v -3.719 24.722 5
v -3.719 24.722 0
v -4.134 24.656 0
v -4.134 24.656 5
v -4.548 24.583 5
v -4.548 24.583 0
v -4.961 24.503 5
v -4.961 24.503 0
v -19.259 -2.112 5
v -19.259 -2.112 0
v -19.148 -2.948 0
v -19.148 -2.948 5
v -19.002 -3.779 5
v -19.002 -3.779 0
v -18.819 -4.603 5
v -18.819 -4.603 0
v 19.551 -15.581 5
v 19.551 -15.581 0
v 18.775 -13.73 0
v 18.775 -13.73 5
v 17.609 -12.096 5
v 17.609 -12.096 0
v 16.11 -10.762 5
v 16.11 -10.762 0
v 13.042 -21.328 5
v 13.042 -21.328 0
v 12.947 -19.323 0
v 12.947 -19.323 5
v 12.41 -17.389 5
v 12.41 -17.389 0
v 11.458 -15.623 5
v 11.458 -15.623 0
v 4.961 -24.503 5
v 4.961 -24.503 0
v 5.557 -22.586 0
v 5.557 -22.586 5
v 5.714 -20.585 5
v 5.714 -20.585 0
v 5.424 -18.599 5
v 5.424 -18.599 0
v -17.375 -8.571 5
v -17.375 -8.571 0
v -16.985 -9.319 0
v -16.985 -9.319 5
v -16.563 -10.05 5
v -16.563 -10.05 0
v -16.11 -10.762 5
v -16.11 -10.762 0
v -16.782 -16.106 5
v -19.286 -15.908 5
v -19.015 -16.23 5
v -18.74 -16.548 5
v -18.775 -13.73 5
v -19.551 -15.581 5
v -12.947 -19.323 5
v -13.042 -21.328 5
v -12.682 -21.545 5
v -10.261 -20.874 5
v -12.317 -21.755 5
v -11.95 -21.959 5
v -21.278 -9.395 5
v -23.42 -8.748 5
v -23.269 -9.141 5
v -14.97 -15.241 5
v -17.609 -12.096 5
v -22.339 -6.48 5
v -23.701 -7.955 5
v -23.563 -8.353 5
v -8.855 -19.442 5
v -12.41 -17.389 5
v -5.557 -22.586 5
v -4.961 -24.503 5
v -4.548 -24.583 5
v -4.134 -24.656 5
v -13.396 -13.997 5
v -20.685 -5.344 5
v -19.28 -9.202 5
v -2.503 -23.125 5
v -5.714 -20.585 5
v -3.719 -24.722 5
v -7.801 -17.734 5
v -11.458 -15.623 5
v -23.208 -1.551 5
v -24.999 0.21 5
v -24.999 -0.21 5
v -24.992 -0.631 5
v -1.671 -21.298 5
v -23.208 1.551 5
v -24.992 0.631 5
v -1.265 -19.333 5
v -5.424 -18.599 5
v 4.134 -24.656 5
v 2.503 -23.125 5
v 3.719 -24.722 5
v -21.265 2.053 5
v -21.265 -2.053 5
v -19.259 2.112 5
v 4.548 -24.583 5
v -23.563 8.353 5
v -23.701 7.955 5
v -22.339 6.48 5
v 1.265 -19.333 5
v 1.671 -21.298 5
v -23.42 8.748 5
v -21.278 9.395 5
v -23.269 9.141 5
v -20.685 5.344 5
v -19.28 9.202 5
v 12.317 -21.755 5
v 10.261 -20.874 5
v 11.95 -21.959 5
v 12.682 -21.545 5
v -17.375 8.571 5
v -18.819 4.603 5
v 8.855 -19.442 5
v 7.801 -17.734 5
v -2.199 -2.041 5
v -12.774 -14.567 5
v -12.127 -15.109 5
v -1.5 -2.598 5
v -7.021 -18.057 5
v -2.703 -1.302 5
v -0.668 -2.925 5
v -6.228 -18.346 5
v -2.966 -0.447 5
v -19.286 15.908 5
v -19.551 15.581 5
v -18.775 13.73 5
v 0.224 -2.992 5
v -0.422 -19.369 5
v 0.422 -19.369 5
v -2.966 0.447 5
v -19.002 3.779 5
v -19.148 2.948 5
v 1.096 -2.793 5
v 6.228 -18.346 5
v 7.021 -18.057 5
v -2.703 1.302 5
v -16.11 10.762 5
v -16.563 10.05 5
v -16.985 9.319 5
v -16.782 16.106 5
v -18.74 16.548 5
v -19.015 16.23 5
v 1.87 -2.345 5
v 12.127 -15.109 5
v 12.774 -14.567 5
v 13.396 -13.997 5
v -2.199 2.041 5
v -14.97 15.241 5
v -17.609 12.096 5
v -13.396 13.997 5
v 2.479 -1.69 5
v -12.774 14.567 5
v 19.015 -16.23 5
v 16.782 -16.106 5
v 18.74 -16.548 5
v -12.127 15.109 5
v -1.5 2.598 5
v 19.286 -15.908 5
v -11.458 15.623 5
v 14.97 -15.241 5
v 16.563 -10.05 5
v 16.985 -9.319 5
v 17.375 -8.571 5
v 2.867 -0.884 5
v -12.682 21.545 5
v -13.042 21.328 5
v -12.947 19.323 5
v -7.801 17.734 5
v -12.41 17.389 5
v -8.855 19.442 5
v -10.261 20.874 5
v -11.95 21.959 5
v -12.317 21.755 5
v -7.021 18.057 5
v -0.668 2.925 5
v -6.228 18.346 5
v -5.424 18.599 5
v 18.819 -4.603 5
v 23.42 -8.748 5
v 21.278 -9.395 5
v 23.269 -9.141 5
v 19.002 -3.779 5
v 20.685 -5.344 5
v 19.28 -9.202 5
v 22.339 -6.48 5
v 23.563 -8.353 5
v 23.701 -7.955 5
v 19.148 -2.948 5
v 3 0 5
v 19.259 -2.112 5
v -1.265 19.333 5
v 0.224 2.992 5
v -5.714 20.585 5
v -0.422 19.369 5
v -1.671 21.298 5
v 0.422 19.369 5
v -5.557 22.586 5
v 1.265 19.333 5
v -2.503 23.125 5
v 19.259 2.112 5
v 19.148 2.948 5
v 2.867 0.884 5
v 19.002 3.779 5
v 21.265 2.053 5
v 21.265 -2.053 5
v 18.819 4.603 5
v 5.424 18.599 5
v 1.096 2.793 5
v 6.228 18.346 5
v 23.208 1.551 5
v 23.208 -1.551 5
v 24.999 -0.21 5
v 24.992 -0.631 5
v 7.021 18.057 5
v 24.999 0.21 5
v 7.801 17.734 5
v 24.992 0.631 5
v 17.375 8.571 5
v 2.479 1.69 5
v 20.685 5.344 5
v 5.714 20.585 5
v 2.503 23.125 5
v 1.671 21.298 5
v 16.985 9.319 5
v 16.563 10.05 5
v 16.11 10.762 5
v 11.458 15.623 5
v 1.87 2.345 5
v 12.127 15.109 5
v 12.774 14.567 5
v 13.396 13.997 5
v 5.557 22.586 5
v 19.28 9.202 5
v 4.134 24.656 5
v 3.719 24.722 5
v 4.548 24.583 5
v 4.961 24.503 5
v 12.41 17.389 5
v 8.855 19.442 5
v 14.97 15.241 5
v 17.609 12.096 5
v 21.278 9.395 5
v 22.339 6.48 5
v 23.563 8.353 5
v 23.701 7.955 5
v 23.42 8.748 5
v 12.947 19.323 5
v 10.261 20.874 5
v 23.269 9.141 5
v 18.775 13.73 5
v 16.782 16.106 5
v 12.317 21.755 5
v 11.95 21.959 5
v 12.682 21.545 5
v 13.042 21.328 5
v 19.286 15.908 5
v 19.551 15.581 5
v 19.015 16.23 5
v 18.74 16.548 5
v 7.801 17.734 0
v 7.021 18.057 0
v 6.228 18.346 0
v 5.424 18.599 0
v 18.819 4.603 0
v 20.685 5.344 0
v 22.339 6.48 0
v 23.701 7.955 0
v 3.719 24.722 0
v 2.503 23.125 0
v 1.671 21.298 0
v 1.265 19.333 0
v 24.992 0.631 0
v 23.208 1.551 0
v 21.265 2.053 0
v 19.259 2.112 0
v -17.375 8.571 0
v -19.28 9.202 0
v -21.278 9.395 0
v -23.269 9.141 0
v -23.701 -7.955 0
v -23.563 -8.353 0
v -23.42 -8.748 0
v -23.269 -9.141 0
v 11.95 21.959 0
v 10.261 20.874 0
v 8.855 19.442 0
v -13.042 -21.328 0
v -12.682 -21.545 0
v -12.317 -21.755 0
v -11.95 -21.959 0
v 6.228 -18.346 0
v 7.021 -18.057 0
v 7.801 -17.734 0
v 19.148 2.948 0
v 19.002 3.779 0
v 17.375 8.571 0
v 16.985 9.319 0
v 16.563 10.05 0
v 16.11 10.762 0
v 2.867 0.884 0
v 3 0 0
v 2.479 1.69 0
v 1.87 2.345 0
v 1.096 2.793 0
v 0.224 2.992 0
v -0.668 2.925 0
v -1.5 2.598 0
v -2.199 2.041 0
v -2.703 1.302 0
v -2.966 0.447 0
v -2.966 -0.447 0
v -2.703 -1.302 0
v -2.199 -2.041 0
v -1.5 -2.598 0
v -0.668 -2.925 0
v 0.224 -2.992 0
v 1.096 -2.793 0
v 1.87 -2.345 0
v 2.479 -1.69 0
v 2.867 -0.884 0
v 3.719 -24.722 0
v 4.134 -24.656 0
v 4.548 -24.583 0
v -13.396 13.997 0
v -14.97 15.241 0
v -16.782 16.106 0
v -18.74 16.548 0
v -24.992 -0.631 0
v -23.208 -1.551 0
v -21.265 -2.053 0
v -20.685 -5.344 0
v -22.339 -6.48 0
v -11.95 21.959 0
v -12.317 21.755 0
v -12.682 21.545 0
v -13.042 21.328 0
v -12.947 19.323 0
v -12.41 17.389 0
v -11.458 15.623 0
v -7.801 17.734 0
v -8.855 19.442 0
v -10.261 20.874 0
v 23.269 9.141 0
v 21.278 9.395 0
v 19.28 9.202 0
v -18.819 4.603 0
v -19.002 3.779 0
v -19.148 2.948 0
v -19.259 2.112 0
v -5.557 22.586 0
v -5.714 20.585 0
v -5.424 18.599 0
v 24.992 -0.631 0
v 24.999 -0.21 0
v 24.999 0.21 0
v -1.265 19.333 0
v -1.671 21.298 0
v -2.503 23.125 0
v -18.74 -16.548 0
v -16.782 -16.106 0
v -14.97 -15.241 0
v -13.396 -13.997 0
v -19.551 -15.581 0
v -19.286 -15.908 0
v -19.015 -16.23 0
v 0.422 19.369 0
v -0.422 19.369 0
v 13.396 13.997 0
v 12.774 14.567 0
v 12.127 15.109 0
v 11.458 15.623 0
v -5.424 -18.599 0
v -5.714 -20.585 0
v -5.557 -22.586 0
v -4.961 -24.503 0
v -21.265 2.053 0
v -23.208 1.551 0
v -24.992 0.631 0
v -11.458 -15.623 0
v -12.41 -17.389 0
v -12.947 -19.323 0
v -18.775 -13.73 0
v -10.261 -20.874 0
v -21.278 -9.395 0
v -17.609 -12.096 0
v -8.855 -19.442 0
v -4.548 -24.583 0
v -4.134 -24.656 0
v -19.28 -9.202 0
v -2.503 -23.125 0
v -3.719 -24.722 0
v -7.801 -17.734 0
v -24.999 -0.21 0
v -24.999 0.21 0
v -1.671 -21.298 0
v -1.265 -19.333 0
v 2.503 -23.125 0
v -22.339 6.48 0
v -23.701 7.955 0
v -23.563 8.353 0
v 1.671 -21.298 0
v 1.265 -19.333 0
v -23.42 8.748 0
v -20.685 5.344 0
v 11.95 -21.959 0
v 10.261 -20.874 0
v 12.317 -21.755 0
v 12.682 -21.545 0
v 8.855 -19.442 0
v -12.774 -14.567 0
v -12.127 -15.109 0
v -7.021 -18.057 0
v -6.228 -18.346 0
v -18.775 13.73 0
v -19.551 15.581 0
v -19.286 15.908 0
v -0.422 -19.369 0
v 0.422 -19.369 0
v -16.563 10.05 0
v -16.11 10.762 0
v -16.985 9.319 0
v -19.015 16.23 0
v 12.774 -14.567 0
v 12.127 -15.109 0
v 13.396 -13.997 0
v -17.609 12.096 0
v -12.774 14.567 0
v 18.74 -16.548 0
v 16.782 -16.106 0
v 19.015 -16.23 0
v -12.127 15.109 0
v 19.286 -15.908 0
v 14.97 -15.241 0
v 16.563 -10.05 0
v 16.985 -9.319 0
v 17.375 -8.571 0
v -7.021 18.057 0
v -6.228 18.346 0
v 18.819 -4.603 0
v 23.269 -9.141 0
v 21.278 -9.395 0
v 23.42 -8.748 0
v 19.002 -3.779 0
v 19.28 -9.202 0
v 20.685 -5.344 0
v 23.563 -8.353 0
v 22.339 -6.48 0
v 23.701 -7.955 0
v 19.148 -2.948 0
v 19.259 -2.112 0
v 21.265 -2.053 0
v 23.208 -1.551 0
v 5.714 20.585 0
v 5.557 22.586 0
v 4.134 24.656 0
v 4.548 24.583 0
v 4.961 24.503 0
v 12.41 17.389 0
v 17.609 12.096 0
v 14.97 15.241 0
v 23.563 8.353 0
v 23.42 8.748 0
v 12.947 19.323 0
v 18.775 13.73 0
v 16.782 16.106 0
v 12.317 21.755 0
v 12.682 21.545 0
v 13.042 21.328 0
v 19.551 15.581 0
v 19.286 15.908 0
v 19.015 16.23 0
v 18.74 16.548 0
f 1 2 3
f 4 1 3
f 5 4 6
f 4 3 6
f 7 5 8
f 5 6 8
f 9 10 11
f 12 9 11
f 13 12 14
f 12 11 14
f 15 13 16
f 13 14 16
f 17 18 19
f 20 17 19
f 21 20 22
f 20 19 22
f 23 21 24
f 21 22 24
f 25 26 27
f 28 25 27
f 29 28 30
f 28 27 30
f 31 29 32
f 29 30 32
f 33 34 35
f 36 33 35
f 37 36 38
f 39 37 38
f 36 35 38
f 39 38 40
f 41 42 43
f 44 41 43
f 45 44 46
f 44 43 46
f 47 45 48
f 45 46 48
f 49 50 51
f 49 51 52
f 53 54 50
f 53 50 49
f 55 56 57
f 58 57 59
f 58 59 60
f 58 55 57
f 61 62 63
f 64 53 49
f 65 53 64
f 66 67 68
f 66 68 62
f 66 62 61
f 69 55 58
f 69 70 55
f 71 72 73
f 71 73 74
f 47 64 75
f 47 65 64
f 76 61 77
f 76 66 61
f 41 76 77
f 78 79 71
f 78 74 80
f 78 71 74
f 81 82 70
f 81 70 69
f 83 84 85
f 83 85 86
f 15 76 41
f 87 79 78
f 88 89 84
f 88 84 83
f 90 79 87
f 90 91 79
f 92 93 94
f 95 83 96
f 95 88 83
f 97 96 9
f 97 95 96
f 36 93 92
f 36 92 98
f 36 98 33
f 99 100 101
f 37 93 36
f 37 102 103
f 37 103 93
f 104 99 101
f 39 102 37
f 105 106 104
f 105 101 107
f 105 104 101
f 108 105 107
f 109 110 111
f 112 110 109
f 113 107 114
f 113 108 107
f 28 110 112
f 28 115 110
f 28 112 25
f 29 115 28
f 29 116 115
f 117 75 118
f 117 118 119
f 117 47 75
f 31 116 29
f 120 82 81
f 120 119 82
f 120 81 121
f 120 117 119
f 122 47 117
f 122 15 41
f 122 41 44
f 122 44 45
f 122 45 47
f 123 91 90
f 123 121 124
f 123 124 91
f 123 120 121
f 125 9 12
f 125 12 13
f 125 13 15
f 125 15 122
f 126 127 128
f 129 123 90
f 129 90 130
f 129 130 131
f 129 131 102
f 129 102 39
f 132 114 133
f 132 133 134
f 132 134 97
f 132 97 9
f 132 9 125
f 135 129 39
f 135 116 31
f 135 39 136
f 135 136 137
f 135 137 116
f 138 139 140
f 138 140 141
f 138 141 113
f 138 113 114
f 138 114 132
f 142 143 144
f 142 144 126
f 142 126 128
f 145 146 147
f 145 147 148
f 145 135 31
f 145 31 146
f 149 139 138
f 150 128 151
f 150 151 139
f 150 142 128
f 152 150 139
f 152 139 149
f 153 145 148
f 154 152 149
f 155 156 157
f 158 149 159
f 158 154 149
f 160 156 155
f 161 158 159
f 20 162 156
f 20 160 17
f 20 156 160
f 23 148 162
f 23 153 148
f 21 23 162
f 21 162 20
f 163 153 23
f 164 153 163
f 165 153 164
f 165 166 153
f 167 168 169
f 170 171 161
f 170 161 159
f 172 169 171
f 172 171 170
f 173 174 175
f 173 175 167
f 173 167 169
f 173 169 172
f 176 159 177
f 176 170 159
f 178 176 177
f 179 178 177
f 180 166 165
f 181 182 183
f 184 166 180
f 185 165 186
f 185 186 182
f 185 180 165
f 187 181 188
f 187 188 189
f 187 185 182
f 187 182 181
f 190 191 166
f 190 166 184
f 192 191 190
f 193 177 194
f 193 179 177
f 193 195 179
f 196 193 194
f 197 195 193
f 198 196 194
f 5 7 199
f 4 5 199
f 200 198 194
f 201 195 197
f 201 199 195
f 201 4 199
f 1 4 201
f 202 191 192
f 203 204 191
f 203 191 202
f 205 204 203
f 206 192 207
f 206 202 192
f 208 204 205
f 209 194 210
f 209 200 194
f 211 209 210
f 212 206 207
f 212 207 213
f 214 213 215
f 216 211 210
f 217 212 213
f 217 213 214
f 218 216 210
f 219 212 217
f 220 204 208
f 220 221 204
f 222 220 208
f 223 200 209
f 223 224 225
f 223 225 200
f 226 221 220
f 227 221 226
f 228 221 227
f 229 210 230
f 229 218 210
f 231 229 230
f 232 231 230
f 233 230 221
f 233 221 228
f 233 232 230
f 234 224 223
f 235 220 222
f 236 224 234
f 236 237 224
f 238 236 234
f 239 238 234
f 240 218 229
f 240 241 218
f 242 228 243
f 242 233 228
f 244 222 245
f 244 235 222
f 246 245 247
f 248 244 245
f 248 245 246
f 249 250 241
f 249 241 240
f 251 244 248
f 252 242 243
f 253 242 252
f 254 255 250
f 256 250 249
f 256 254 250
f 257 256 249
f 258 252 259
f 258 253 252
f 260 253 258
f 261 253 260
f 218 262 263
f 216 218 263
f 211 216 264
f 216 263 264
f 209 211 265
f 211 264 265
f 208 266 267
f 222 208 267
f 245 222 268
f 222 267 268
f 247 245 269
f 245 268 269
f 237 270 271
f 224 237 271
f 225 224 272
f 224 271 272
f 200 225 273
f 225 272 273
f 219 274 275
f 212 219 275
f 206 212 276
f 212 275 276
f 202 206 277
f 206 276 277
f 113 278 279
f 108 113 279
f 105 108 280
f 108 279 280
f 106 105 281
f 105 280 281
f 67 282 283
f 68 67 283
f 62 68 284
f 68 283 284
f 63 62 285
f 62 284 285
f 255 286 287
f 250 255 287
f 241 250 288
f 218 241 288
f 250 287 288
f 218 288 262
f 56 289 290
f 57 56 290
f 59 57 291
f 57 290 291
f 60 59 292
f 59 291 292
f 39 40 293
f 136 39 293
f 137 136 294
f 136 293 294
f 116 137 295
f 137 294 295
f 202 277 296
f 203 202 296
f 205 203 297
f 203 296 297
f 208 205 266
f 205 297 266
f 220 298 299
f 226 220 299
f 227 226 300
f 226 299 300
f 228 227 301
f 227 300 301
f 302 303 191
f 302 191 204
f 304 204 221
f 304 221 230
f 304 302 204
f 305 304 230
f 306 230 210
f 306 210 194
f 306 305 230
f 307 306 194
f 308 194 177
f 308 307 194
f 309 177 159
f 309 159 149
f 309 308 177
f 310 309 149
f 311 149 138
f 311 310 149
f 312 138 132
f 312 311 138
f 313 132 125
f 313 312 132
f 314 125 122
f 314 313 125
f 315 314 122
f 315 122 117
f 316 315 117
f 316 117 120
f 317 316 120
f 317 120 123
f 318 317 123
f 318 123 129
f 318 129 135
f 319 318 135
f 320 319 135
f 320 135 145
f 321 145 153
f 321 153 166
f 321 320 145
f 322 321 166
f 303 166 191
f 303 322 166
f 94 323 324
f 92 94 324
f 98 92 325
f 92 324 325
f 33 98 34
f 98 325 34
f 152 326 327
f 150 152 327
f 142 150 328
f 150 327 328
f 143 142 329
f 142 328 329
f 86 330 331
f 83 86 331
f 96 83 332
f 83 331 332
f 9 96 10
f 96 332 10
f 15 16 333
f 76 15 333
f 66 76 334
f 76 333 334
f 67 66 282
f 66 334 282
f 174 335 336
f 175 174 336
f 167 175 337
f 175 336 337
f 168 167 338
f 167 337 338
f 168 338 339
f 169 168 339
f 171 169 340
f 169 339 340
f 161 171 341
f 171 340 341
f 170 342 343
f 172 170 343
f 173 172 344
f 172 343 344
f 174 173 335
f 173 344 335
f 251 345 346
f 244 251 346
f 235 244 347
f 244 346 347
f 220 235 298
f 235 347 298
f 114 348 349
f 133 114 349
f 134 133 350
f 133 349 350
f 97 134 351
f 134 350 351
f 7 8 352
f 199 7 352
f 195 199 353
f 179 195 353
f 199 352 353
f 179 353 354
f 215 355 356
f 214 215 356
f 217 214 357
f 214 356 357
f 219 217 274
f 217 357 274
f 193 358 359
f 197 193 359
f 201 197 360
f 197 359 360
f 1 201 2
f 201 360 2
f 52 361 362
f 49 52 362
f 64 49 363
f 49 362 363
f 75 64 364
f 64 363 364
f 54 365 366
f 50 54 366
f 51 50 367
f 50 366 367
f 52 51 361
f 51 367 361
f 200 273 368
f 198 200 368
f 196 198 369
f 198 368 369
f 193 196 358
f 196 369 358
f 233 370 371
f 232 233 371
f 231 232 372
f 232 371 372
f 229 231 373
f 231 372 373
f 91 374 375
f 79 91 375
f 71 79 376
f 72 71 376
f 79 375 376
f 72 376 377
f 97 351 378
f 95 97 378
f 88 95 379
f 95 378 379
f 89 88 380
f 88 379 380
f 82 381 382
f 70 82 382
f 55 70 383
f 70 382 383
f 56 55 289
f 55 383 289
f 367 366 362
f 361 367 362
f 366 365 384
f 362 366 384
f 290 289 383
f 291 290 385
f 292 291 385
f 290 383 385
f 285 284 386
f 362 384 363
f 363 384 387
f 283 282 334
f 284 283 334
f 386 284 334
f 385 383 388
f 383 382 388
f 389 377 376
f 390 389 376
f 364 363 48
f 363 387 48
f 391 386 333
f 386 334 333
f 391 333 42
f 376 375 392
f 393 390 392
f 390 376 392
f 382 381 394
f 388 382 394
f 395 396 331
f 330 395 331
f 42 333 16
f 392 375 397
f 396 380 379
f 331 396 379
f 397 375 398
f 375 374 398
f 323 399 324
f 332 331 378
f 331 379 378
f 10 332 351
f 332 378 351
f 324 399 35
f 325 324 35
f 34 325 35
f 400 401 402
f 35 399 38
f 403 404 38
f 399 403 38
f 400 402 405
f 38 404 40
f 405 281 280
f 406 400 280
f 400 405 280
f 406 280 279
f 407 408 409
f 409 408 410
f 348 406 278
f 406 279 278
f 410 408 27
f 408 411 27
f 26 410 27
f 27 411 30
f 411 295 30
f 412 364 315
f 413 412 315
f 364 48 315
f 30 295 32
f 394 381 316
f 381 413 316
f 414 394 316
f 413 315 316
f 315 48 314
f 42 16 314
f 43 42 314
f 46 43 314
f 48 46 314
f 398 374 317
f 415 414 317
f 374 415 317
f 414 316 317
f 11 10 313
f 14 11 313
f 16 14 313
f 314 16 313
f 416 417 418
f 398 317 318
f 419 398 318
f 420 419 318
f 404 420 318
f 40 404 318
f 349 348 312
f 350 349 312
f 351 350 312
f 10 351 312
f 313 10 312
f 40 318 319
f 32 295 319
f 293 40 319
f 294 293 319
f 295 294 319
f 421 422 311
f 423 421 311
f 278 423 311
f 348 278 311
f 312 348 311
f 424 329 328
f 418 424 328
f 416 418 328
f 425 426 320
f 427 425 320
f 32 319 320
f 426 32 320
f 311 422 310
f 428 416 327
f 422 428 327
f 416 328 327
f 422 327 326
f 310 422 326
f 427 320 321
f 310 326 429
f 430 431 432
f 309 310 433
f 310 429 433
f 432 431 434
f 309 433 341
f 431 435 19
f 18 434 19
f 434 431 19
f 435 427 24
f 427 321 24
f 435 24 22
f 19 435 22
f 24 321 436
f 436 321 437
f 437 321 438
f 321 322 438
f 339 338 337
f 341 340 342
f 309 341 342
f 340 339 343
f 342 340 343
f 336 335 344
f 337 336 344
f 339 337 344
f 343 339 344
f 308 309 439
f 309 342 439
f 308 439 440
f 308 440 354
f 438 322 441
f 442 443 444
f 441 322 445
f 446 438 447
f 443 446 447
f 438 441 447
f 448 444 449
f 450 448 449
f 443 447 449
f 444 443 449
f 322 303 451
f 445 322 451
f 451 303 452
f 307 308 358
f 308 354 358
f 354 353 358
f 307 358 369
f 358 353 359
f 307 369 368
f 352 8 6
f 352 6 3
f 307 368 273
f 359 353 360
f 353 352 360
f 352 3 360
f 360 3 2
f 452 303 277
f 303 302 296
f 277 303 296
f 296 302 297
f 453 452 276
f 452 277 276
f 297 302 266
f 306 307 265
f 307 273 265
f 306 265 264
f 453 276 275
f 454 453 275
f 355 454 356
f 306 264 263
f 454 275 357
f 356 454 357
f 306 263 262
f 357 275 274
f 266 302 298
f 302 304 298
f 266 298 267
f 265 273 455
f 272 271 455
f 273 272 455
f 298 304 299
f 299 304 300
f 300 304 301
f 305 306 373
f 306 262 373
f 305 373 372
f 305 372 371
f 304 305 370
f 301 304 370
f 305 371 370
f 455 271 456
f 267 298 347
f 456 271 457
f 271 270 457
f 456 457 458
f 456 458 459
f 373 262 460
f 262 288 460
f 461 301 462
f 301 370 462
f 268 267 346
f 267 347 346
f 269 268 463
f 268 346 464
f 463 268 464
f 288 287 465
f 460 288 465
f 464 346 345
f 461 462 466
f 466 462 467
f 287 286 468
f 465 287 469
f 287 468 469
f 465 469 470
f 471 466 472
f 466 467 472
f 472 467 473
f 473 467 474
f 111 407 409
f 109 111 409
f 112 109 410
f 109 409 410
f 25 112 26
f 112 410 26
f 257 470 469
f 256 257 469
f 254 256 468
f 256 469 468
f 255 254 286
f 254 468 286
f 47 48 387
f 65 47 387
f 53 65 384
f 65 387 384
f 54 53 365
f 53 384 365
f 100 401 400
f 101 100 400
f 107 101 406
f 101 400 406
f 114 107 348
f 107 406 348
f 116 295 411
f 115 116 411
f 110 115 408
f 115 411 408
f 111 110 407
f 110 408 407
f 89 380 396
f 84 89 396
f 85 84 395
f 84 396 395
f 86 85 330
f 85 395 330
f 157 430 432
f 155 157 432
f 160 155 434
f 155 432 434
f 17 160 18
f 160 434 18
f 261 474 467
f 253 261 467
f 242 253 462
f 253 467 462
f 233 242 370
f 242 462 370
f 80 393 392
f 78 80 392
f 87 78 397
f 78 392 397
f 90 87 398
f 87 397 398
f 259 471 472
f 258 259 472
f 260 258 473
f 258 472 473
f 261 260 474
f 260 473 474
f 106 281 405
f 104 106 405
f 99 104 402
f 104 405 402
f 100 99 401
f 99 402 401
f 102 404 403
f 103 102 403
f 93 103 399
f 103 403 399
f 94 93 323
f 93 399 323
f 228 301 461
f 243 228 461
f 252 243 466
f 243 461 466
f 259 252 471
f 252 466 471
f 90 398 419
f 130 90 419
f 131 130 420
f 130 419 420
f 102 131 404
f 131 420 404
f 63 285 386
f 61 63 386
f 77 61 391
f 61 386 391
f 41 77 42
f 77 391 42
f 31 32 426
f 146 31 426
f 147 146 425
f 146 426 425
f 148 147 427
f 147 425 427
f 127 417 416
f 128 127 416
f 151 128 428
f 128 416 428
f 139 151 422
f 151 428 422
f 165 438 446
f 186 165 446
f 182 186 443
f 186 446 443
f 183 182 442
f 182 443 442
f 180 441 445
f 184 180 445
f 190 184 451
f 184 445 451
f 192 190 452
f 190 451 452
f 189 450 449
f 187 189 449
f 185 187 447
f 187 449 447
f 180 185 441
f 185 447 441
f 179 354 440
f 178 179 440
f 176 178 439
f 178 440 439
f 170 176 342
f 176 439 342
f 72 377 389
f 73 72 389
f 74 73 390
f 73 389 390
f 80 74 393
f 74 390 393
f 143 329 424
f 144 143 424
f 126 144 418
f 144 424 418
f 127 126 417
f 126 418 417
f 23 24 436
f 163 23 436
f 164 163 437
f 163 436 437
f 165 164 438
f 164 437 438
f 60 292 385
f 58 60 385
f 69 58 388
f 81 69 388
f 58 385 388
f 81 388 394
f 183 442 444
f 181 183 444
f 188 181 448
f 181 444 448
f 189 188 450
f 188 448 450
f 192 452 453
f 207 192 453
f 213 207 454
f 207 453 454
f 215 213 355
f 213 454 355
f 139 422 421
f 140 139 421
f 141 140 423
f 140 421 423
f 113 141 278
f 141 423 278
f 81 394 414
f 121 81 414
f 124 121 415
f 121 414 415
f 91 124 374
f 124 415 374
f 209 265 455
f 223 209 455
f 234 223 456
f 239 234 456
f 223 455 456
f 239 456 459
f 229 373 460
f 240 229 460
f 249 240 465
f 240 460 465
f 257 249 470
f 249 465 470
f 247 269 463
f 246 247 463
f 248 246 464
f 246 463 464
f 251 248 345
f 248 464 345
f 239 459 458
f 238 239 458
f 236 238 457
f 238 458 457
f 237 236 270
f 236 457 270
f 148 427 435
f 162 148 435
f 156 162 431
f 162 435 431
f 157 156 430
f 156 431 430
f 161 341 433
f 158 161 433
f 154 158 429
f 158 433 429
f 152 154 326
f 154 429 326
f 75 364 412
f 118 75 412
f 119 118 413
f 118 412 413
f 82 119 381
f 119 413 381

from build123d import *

# Parameters (mm, degrees)
SKETCH1_R           = 3
BOSS_EXTRUDE2_DEPTH = 5


with BuildPart() as part:
    # Sketch1 → Boss-Extrude2 (new body)
    with BuildSketch(Plane.XY):
        with BuildLine():
            ThreePointArc((-19.550519413, 15.581309017), (-18.238129642, 12.880402273), (-16.110253623, 10.761580005))
            ThreePointArc((-16.110253623, 10.761580005), (-16.778376173, 9.687), (-17.374928481, 8.571098896))
            ThreePointArc((-17.374928481, 8.571098896), (-20.2738204, 9.354482451), (-23.269069139, 9.14059196))
            ThreePointArc((-23.269069139, 9.14059196), (-23.49231552, 8.550503583), (-23.700600368, 7.954969654))
            ThreePointArc((-23.700600368, 7.954969654), (-21.543592873, 5.865811255), (-18.819363584, 4.602546066))
            ThreePointArc((-18.819363584, 4.602546066), (-19.079665407, 3.364259794), (-19.258580553, 2.111622855))
            ThreePointArc((-19.258580553, 2.111622855), (-22.250580854, 1.856283171), (-24.992039135, 0.630856452))
            ThreePointArc((-24.992039135, 0.630856452), (-25, 0), (-24.992039135, -0.630856452))
            ThreePointArc((-24.992039135, -0.630856452), (-22.250580854, -1.856283171), (-19.258580553, -2.111622855))
            ThreePointArc((-19.258580553, -2.111622855), (-19.079665407, -3.364259794), (-18.819363584, -4.602546066))
            ThreePointArc((-18.819363584, -4.602546066), (-21.543592873, -5.865811255), (-23.700600368, -7.954969654))
            ThreePointArc((-23.700600368, -7.954969654), (-23.49231552, -8.550503583), (-23.269069139, -9.14059196))
            ThreePointArc((-23.269069139, -9.14059196), (-20.2738204, -9.354482451), (-17.374928481, -8.571098896))
            ThreePointArc((-17.374928481, -8.571098896), (-16.778376173, -9.687), (-16.110253623, -10.761580005))
            ThreePointArc((-16.110253623, -10.761580005), (-18.238129642, -12.880402273), (-19.550519413, -15.581309017))
            ThreePointArc((-19.550519413, -15.581309017), (-19.151111078, -16.069690242), (-18.739505991, -16.547837177))
            ThreePointArc((-18.739505991, -16.547837177), (-15.851737997, -15.724393089), (-13.395603607, -13.996773914))
            ThreePointArc((-13.395603607, -13.996773914), (-12.45336715, -14.841345041), (-11.458009312, -15.622608572))
            ThreePointArc((-11.458009312, -15.622608572), (-12.73287881, -18.341426683), (-13.042357282, -21.328312557))
            ThreePointArc((-13.042357282, -21.328312557), (-12.5, -21.650635095), (-11.949681854, -21.95916901))
            ThreePointArc((-11.949681854, -21.95916901), (-9.517702044, -20.197709854), (-7.800571241, -17.734231427))
            ThreePointArc((-7.800571241, -17.734231427), (-6.626298257, -18.205604835), (-5.423759977, -18.59931998))
            ThreePointArc((-5.423759977, -18.59931998), (-5.691854876, -21.590204344), (-4.961094377, -24.502806831))
            ThreePointArc((-4.961094377, -24.502806831), (-4.341204442, -24.620193825), (-3.718549727, -24.721900977))
            ThreePointArc((-3.718549727, -24.721900977), (-2.035690758, -22.234884724), (-1.264674858, -19.332678901))
            ThreePointArc((-1.264674858, -19.332678901), (0, -19.374), (1.264674858, -19.332678901))
            ThreePointArc((1.264674858, -19.332678901), (2.035690758, -22.234884724), (3.718549727, -24.721900977))
            ThreePointArc((3.718549727, -24.721900977), (4.341204442, -24.620193825), (4.961094377, -24.502806831))
            ThreePointArc((4.961094377, -24.502806831), (5.691854876, -21.590204344), (5.423759977, -18.59931998))
            ThreePointArc((5.423759977, -18.59931998), (6.626298257, -18.205604835), (7.800571241, -17.734231427))
            ThreePointArc((7.800571241, -17.734231427), (9.517702044, -20.197709854), (11.949681854, -21.95916901))
            ThreePointArc((11.949681854, -21.95916901), (12.5, -21.650635095), (13.042357282, -21.328312557))
            ThreePointArc((13.042357282, -21.328312557), (12.73287881, -18.341426683), (11.458009312, -15.622608572))
            ThreePointArc((11.458009312, -15.622608572), (12.45336715, -14.841345041), (13.395603607, -13.996773914))
            ThreePointArc((13.395603607, -13.996773914), (15.851737997, -15.724393089), (18.739505991, -16.547837177))
            ThreePointArc((18.739505991, -16.547837177), (19.151111078, -16.069690242), (19.550519413, -15.581309017))
            ThreePointArc((19.550519413, -15.581309017), (18.238129642, -12.880402273), (16.110253623, -10.761580005))
            ThreePointArc((16.110253623, -10.761580005), (16.778376173, -9.687), (17.374928481, -8.571098896))
            ThreePointArc((17.374928481, -8.571098896), (20.2738204, -9.354482451), (23.269069139, -9.14059196))
            ThreePointArc((23.269069139, -9.14059196), (23.49231552, -8.550503583), (23.700600368, -7.954969654))
            ThreePointArc((23.700600368, -7.954969654), (21.543592873, -5.865811255), (18.819363584, -4.602546066))
            ThreePointArc((18.819363584, -4.602546066), (19.079665407, -3.364259794), (19.258580553, -2.111622855))
            ThreePointArc((19.258580553, -2.111622855), (22.250580854, -1.856283171), (24.992039135, -0.630856452))
            ThreePointArc((24.992039135, -0.630856452), (25, 0), (24.992039135, 0.630856452))
            ThreePointArc((24.992039135, 0.630856452), (22.250580854, 1.856283171), (19.258580553, 2.111622855))
            ThreePointArc((19.258580553, 2.111622855), (19.079665407, 3.364259794), (18.819363584, 4.602546066))
            ThreePointArc((18.819363584, 4.602546066), (21.543592873, 5.865811255), (23.700600368, 7.954969654))
            ThreePointArc((23.700600368, 7.954969654), (23.49231552, 8.550503583), (23.269069139, 9.14059196))
            ThreePointArc((23.269069139, 9.14059196), (20.2738204, 9.354482451), (17.374928481, 8.571098896))
            ThreePointArc((17.374928481, 8.571098896), (16.778376173, 9.687), (16.110253623, 10.761580005))
            ThreePointArc((16.110253623, 10.761580005), (18.238129642, 12.880402273), (19.550519413, 15.581309017))
            ThreePointArc((19.550519413, 15.581309017), (19.151111078, 16.069690242), (18.739505991, 16.547837177))
            ThreePointArc((18.739505991, 16.547837177), (15.851737997, 15.724393089), (13.395603607, 13.996773914))
            ThreePointArc((13.395603607, 13.996773914), (12.45336715, 14.841345041), (11.458009312, 15.622608572))
            ThreePointArc((11.458009312, 15.622608572), (12.73287881, 18.341426683), (13.042357282, 21.328312557))
            ThreePointArc((13.042357282, 21.328312557), (12.5, 21.650635095), (11.949681854, 21.95916901))
            ThreePointArc((11.949681854, 21.95916901), (9.517702044, 20.197709854), (7.800571241, 17.734231427))
            ThreePointArc((7.800571241, 17.734231427), (6.626298257, 18.205604835), (5.423759977, 18.59931998))
            ThreePointArc((5.423759977, 18.59931998), (5.691854876, 21.590204344), (4.961094377, 24.502806831))
            ThreePointArc((4.961094377, 24.502806831), (4.341204442, 24.620193825), (3.718549727, 24.721900977))
            ThreePointArc((3.718549727, 24.721900977), (2.035690758, 22.234884724), (1.264674858, 19.332678901))
            ThreePointArc((1.264674858, 19.332678901), (0, 19.374), (-1.264674858, 19.332678901))
            ThreePointArc((-1.264674858, 19.332678901), (-2.035690758, 22.234884724), (-3.718549727, 24.721900977))
            ThreePointArc((-3.718549727, 24.721900977), (-4.341204442, 24.620193825), (-4.961094377, 24.502806831))
            ThreePointArc((-4.961094377, 24.502806831), (-5.691854876, 21.590204344), (-5.423759977, 18.59931998))
            ThreePointArc((-5.423759977, 18.59931998), (-6.626298257, 18.205604835), (-7.800571241, 17.734231427))
            ThreePointArc((-7.800571241, 17.734231427), (-9.517702044, 20.197709854), (-11.949681854, 21.95916901))
            ThreePointArc((-11.949681854, 21.95916901), (-12.5, 21.650635095), (-13.042357282, 21.328312557))
            ThreePointArc((-13.042357282, 21.328312557), (-12.73287881, 18.341426683), (-11.458009312, 15.622608572))
            ThreePointArc((-11.458009312, 15.622608572), (-12.45336715, 14.841345041), (-13.395603607, 13.996773914))
            ThreePointArc((-13.395603607, 13.996773914), (-15.851737997, 15.724393089), (-18.739505991, 16.547837177))
            ThreePointArc((-18.739505991, 16.547837177), (-19.151111078, 16.069690242), (-19.550519413, 15.581309017))
        make_face()
        Circle(SKETCH1_R, mode=Mode.SUBTRACT)
    extrude(amount=BOSS_EXTRUDE2_DEPTH)


solid = part.part
